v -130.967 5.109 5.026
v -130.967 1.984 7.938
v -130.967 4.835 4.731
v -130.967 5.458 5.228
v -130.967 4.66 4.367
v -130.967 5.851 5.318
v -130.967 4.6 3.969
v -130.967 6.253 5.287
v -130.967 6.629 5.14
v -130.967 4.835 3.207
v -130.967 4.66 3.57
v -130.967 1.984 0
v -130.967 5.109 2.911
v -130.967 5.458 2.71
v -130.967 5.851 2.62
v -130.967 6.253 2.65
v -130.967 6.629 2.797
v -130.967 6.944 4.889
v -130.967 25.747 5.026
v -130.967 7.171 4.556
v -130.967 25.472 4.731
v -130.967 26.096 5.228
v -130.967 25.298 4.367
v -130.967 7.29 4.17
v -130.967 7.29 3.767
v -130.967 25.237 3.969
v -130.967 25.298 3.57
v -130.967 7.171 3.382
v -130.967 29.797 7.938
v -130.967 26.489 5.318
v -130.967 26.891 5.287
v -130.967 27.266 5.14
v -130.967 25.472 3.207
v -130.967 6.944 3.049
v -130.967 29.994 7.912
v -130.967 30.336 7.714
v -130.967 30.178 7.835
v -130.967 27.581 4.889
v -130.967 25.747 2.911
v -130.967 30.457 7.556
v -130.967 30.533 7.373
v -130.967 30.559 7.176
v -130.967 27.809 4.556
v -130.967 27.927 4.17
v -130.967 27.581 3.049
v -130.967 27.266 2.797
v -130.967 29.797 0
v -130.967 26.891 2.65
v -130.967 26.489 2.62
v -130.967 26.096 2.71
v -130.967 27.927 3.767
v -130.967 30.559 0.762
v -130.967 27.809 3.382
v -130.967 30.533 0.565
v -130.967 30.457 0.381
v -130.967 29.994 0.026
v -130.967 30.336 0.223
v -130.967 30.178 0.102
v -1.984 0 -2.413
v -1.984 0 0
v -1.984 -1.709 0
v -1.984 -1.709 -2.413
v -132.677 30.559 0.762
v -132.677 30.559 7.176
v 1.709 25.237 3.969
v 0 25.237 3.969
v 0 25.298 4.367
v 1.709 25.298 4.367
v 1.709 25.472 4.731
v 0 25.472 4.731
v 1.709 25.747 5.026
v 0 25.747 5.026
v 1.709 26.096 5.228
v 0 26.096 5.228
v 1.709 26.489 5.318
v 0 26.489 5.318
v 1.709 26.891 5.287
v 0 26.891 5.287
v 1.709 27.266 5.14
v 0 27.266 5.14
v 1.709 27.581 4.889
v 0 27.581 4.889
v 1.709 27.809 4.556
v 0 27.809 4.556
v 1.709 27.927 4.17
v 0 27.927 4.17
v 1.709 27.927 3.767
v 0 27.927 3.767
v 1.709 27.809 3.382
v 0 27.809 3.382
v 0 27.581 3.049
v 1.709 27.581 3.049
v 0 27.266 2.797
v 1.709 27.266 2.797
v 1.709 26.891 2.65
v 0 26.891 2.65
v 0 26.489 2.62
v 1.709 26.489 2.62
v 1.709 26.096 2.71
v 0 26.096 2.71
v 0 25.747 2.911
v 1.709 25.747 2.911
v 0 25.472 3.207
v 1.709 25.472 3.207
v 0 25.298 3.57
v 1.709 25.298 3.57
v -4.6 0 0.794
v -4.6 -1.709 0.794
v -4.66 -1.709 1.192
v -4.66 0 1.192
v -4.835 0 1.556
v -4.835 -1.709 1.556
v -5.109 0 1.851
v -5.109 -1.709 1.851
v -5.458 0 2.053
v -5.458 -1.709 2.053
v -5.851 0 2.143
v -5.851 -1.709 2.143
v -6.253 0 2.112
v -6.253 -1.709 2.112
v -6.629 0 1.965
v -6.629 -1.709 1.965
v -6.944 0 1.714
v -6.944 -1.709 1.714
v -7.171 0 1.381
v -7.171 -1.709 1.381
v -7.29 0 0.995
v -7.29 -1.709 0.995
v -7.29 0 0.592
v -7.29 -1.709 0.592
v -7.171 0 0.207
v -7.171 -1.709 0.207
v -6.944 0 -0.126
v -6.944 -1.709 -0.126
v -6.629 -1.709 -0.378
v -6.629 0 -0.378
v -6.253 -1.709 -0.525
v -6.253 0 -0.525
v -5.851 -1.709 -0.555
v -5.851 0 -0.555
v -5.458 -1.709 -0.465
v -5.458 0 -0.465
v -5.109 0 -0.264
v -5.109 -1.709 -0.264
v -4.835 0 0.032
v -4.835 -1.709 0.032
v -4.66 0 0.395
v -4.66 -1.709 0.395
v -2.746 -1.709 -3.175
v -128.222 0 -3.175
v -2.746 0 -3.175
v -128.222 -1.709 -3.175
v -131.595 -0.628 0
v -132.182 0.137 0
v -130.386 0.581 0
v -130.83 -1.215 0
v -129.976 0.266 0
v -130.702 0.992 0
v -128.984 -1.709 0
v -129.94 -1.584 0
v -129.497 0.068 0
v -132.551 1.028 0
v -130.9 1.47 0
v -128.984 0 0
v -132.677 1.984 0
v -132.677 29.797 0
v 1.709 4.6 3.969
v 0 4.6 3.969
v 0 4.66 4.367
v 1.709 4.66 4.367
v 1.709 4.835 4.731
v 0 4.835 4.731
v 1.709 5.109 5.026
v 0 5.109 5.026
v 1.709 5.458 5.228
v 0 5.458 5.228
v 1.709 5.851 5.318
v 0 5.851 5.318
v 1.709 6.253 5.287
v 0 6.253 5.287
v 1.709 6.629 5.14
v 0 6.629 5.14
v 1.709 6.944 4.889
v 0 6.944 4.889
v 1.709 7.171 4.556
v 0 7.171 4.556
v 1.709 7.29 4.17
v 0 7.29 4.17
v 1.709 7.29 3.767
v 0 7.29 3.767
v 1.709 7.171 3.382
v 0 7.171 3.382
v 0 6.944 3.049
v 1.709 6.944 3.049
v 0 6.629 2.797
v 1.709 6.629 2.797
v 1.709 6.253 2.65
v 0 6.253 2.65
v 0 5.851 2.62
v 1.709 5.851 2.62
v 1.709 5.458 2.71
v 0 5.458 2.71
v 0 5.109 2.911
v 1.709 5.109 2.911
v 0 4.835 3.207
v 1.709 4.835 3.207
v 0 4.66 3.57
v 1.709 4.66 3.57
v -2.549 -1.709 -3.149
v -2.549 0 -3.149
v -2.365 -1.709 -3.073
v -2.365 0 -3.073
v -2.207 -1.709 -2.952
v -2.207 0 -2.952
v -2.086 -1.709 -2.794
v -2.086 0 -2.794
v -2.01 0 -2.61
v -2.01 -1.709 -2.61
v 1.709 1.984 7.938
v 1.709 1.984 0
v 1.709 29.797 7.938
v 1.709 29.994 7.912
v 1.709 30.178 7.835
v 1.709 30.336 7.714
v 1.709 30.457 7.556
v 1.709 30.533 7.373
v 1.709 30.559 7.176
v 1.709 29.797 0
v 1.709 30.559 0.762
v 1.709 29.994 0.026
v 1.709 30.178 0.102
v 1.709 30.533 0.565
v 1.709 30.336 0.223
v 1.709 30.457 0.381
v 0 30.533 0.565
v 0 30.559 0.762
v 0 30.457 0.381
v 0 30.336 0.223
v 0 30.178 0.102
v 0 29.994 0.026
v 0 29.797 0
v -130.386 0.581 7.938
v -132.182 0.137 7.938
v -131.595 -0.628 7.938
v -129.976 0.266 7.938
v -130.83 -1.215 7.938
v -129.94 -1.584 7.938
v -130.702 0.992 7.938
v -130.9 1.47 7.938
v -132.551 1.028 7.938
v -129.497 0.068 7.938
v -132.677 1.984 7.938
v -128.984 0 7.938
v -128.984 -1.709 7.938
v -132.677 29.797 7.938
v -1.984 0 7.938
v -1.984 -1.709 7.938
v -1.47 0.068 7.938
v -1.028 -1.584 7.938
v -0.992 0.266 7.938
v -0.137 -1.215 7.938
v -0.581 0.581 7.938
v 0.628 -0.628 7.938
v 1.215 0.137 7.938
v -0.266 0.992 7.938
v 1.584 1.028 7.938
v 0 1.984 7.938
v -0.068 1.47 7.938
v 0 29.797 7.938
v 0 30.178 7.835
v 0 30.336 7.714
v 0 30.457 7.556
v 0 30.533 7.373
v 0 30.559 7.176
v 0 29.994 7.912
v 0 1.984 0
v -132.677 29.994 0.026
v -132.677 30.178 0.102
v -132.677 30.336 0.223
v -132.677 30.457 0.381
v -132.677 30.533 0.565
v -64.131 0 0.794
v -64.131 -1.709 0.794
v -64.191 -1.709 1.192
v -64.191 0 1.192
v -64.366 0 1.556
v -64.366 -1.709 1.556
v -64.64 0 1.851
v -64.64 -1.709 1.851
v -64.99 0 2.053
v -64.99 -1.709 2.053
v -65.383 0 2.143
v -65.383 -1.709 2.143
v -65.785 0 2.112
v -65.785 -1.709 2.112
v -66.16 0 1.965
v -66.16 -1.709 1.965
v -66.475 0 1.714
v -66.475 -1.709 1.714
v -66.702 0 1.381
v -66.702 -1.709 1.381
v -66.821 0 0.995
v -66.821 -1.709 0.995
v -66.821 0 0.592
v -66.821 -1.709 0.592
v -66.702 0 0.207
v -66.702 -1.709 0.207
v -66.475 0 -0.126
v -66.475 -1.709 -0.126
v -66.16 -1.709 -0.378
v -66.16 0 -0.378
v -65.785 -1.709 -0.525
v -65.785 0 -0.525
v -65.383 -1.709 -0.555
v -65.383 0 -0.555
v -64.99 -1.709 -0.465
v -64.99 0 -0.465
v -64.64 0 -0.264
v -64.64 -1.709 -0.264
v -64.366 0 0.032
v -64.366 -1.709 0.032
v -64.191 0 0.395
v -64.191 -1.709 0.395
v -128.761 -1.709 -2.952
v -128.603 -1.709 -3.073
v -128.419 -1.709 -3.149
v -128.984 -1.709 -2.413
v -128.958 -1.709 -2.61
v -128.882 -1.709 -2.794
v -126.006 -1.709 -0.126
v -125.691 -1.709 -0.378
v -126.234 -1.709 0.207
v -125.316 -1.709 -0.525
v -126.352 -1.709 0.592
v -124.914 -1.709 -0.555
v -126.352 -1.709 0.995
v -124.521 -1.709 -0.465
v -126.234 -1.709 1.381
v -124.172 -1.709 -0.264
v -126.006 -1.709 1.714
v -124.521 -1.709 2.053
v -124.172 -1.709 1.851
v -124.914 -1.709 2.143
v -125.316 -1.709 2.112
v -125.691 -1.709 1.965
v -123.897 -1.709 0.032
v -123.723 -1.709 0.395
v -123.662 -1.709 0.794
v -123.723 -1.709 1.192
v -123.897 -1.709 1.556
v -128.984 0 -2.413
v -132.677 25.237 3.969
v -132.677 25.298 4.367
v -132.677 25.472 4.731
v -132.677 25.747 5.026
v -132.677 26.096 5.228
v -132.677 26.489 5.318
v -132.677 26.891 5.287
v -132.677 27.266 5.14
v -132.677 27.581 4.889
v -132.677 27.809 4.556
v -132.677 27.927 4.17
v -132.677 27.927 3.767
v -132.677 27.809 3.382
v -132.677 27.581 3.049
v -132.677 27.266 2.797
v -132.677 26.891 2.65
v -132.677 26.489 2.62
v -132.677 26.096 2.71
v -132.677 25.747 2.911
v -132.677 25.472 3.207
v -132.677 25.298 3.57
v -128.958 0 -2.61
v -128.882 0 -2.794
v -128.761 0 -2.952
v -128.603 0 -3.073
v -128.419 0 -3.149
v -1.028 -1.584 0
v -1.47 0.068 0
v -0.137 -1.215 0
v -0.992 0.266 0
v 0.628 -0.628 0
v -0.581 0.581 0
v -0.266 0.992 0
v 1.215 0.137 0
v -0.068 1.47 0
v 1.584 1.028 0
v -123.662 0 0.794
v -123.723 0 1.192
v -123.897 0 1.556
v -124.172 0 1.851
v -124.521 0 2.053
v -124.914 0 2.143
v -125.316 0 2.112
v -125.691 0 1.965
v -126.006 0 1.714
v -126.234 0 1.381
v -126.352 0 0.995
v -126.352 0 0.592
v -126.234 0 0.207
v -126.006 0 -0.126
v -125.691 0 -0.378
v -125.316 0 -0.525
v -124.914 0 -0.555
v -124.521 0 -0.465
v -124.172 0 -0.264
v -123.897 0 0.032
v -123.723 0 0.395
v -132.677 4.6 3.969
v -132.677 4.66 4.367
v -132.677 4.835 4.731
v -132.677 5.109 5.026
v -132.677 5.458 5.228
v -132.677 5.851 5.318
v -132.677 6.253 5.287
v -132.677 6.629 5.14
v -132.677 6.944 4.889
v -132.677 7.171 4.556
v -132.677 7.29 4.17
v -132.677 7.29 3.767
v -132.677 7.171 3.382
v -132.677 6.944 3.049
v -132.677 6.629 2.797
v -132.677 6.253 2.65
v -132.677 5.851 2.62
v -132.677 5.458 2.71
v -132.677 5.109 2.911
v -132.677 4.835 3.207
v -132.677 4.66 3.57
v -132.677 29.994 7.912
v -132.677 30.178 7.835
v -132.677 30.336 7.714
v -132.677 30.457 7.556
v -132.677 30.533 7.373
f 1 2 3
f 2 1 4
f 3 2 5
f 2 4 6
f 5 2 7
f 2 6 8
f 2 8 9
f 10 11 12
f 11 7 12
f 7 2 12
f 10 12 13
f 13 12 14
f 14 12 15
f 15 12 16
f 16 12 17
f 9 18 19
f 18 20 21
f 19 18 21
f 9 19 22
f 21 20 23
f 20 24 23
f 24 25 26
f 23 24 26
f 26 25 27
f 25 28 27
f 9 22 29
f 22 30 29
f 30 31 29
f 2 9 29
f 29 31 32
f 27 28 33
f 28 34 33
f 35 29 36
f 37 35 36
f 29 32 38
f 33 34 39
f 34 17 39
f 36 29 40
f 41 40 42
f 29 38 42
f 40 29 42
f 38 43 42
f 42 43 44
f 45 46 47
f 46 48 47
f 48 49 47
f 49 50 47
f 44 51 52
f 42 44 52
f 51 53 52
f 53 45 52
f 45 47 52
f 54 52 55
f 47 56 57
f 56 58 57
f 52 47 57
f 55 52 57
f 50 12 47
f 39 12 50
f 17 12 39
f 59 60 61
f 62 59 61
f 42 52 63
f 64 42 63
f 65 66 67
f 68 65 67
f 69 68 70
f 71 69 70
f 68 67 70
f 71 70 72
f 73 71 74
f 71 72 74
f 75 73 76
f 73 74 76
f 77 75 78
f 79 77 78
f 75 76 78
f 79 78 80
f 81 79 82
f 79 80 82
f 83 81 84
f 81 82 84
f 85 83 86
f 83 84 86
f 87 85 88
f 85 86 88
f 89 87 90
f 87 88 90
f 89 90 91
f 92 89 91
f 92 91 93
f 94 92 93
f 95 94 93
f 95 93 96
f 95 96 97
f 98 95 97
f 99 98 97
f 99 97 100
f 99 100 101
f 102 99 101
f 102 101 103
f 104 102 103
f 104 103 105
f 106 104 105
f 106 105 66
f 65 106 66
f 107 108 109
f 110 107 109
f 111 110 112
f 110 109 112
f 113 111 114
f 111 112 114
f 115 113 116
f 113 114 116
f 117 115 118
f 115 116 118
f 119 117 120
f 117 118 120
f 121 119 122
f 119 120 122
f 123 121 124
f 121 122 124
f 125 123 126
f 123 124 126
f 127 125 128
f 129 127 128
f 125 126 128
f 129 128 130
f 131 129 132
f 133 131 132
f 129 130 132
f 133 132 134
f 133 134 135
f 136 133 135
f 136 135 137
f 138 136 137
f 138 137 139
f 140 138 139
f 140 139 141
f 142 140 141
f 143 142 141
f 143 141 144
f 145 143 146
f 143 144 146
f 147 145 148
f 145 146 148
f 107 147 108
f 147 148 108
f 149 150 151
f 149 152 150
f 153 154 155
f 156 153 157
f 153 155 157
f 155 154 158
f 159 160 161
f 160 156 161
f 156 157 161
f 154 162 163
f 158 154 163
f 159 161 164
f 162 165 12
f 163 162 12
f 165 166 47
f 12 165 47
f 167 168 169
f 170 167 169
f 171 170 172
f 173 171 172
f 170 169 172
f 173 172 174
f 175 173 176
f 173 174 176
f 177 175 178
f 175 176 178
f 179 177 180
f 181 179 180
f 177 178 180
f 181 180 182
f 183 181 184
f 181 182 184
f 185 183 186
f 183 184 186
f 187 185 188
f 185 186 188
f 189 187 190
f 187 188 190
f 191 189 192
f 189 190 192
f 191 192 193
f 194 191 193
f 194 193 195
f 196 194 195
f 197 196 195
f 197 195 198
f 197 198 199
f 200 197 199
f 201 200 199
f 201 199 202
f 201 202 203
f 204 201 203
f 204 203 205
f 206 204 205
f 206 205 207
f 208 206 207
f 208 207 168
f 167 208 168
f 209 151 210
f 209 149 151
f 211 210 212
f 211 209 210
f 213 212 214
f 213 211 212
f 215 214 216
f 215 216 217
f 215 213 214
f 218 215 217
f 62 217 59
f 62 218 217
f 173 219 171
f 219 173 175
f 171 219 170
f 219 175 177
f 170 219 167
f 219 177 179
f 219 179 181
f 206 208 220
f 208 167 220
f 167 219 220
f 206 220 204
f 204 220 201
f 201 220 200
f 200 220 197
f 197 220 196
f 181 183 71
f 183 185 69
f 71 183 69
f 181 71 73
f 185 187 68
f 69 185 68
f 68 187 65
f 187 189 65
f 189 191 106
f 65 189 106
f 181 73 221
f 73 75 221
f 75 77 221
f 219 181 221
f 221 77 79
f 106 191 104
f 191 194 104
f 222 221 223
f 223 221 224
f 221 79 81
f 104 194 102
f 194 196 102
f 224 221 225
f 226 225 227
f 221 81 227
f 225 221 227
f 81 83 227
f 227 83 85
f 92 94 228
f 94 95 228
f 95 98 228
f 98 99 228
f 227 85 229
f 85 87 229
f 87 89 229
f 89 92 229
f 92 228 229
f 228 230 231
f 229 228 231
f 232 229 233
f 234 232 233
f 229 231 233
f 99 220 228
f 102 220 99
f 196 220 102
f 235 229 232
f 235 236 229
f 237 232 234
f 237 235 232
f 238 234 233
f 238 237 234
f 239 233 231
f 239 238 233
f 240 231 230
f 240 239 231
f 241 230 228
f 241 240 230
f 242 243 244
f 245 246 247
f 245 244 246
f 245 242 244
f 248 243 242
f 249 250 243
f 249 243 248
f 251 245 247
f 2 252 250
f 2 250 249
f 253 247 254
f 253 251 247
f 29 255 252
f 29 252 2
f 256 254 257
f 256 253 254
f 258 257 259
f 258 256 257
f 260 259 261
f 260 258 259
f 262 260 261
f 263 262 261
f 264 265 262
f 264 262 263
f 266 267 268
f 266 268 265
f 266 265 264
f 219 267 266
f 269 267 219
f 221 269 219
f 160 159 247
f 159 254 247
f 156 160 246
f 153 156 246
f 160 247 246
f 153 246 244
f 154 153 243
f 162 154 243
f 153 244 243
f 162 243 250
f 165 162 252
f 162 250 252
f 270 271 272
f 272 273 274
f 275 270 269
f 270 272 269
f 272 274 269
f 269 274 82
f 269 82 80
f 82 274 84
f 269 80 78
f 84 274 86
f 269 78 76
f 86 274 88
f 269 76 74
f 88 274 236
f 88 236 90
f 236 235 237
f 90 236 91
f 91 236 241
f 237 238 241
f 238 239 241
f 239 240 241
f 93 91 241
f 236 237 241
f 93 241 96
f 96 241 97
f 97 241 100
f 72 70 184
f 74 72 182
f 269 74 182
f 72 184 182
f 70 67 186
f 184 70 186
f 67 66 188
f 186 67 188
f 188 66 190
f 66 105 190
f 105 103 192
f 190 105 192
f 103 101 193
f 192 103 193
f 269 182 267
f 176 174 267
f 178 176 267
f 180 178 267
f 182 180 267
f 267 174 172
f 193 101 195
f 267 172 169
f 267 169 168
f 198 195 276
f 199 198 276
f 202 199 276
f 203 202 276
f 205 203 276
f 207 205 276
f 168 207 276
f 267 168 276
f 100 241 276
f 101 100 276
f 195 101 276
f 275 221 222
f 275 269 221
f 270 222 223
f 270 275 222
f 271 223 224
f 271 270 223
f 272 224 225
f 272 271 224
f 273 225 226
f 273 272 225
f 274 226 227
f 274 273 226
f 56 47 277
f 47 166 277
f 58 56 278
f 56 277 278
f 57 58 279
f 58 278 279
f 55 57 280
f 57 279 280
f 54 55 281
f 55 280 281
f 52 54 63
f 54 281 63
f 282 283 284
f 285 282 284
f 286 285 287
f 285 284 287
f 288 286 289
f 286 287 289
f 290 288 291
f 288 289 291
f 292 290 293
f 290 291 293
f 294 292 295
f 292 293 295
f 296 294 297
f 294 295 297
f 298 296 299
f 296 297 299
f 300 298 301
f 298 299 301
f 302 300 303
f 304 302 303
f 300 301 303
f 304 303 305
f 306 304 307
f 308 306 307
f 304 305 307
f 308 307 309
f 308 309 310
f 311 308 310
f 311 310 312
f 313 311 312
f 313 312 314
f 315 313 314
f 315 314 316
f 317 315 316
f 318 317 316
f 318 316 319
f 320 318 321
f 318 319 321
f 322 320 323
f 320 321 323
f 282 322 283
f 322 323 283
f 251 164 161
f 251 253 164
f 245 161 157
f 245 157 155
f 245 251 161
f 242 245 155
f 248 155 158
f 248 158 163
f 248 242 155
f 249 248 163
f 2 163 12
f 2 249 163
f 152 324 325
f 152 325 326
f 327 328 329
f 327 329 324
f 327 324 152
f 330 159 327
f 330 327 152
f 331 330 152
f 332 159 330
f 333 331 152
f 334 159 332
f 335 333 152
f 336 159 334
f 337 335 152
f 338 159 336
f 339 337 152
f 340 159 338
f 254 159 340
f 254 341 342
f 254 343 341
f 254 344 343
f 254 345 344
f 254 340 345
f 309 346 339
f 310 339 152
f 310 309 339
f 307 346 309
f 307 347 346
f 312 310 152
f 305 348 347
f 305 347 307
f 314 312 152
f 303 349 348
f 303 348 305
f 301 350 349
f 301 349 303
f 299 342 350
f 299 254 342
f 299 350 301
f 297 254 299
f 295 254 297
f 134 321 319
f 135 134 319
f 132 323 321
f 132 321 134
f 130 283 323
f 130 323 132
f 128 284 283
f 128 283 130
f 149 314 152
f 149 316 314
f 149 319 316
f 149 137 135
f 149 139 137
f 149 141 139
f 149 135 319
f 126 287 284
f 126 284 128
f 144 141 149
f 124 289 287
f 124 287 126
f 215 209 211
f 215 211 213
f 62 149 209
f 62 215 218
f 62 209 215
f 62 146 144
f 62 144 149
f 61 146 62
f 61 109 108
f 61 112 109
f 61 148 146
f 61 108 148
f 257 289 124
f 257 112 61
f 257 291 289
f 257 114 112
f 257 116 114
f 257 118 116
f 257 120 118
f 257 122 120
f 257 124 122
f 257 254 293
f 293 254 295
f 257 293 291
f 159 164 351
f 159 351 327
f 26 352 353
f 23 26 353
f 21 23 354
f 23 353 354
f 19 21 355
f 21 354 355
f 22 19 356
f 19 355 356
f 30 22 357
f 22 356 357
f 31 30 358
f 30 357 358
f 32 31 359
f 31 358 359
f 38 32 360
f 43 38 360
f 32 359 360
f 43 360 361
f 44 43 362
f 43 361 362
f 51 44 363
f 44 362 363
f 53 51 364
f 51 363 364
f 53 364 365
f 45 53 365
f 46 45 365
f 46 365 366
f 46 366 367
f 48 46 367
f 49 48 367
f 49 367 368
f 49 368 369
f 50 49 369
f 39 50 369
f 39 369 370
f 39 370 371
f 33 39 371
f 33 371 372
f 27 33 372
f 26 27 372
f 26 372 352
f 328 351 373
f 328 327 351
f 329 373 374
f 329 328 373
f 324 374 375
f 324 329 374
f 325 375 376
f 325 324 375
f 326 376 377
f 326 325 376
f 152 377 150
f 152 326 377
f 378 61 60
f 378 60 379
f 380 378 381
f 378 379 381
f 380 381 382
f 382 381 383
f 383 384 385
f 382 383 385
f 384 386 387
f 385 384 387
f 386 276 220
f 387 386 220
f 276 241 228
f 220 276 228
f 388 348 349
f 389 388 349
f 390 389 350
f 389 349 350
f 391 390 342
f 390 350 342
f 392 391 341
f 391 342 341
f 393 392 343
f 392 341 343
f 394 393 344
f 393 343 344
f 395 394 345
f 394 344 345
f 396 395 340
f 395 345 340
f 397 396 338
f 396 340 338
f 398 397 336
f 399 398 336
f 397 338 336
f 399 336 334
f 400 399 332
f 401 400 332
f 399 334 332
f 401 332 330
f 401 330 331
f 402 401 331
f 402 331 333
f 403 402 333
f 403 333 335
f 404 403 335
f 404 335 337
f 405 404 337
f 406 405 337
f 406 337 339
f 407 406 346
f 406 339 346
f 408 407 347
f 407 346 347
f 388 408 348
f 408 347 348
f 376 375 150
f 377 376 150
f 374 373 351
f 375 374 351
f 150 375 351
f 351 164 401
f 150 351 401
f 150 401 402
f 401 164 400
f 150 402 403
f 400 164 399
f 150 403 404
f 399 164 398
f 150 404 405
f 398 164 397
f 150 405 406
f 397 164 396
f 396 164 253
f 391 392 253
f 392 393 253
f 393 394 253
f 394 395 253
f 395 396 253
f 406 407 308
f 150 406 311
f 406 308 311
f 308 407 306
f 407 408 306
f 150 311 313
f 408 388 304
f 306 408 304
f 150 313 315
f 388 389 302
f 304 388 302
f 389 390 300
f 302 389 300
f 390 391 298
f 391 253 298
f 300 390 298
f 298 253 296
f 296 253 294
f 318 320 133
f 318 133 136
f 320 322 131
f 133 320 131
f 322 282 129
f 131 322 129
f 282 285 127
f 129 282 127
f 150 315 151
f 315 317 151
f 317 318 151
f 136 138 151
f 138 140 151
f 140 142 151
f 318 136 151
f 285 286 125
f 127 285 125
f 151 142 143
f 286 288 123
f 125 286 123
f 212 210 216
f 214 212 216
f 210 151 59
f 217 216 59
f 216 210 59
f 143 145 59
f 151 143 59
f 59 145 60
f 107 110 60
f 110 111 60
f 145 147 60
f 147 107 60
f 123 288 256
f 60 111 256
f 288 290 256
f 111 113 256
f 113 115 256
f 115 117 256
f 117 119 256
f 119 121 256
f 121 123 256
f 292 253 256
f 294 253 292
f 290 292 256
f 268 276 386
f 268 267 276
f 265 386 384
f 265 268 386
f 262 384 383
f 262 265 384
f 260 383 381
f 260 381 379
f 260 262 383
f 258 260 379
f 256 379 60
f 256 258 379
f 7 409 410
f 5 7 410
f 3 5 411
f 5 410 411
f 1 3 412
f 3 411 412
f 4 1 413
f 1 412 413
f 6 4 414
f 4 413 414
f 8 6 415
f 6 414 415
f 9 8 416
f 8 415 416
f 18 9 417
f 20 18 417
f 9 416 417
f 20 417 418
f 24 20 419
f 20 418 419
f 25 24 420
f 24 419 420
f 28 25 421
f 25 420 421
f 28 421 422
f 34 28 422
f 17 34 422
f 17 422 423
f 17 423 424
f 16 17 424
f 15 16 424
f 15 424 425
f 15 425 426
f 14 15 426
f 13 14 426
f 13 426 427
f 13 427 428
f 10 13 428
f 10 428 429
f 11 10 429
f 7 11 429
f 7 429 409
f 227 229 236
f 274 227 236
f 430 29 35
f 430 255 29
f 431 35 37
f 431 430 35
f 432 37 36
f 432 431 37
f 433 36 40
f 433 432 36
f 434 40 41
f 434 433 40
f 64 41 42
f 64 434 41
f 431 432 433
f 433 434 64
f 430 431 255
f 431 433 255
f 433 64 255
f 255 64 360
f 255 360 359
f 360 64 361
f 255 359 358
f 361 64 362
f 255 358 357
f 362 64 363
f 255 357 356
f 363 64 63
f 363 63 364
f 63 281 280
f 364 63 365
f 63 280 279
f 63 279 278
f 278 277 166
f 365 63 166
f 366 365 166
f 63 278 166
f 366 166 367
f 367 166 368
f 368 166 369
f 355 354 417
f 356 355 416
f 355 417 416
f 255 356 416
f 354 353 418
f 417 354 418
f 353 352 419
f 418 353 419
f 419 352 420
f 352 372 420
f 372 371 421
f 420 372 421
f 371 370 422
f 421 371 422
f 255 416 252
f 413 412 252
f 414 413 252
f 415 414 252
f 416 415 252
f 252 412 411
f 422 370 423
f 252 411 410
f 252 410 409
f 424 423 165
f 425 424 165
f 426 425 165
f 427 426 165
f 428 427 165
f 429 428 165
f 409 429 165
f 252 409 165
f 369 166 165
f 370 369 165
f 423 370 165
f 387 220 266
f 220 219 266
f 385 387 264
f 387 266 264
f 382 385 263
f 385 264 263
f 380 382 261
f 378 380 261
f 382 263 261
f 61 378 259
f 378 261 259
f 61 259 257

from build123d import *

# Parameters (mm, degrees)
F1_DEPTH = 7.9375
F2_R     = 1.98374
F3_R     = 3.69316
F4_R     = 1.35255
F5_DEPTH = 134.38632
F6_W     = 127
F6_H     = 1.70942
F7_DEPTH = 3.175
F8_R     = 1.35255
F9_DEPTH = 1.70942
F10_R    = 0.762


with BuildPart() as f1:
    # F0 (on Top) → F1 (new body)
    with BuildSketch(Plane.XY):
        Polygon((0, 30.55874), (0, 0), (-130.96748, 0), (-130.96748, 30.55874), (-132.6769, 30.55874), (-132.6769, -1.70942), (1.70942, -1.70942), (1.70942, 30.55874), align=None)
    extrude(amount=F1_DEPTH)

    # F2
    f2_edges = [f1.edges().sort_by_distance(p)[0] for p in [
        (0, 0, 3.96875),
        (-130.96748, 0, 3.96875),
    ]]
    fillet(f2_edges, radius=F2_R)

    # F3
    f3_edges = [f1.edges().sort_by_distance(p)[0] for p in [
        (1.70942, -1.70942, 3.96875),
        (-132.6769, -1.70942, 3.96875),
    ]]
    fillet(f3_edges, radius=F3_R)

    # F4 (on face) → F5 (cut, through all)
    with BuildSketch(Plane(origin=(-132.6769, 0, 0), x_dir=(0, -1, 0), z_dir=(-1, 0, 0))):
        with Locations((-26.58999, 3.96875)):
            Circle(F4_R)
        with Locations((-5.95249, 3.96875)):
            Circle(F4_R)
    extrude(amount=-F5_DEPTH, mode=Mode.SUBTRACT)

    # F6 (on face) → F7 (join)
    with BuildSketch(Plane(origin=(0, 0, 0), x_dir=(1, 0, 0), z_dir=(0, 0, -1))):
        with Locations((-65.48374, 0.85471)):
            Rectangle(F6_W, F6_H)
    extrude(amount=F7_DEPTH)

    # F8 (on face) → F9 (cut, through all)
    with BuildSketch(Plane.XZ.offset(1.70942)):
        with Locations((-125.01499, 0.79375)):
            Circle(F8_R)
        with Locations((-65.48374, 0.79375)):
            Circle(F8_R)
        with Locations((-5.95249, 0.79375)):
            Circle(F8_R)
    extrude(amount=-F9_DEPTH, mode=Mode.SUBTRACT)

    # F10
    f10_edges = [f1.edges().sort_by_distance(p)[0] for p in [
        (0.85471, 30.55874, 0),
        (0.85471, 30.55874, 7.9375),
        (-131.82219, 30.55874, 0),
        (-131.82219, 30.55874, 7.9375),
        (-128.98374, -0.85471, -3.175),
        (-1.98374, -0.85471, -3.175),
    ]]
    fillet(f10_edges, radius=F10_R)


solid = f1.part
